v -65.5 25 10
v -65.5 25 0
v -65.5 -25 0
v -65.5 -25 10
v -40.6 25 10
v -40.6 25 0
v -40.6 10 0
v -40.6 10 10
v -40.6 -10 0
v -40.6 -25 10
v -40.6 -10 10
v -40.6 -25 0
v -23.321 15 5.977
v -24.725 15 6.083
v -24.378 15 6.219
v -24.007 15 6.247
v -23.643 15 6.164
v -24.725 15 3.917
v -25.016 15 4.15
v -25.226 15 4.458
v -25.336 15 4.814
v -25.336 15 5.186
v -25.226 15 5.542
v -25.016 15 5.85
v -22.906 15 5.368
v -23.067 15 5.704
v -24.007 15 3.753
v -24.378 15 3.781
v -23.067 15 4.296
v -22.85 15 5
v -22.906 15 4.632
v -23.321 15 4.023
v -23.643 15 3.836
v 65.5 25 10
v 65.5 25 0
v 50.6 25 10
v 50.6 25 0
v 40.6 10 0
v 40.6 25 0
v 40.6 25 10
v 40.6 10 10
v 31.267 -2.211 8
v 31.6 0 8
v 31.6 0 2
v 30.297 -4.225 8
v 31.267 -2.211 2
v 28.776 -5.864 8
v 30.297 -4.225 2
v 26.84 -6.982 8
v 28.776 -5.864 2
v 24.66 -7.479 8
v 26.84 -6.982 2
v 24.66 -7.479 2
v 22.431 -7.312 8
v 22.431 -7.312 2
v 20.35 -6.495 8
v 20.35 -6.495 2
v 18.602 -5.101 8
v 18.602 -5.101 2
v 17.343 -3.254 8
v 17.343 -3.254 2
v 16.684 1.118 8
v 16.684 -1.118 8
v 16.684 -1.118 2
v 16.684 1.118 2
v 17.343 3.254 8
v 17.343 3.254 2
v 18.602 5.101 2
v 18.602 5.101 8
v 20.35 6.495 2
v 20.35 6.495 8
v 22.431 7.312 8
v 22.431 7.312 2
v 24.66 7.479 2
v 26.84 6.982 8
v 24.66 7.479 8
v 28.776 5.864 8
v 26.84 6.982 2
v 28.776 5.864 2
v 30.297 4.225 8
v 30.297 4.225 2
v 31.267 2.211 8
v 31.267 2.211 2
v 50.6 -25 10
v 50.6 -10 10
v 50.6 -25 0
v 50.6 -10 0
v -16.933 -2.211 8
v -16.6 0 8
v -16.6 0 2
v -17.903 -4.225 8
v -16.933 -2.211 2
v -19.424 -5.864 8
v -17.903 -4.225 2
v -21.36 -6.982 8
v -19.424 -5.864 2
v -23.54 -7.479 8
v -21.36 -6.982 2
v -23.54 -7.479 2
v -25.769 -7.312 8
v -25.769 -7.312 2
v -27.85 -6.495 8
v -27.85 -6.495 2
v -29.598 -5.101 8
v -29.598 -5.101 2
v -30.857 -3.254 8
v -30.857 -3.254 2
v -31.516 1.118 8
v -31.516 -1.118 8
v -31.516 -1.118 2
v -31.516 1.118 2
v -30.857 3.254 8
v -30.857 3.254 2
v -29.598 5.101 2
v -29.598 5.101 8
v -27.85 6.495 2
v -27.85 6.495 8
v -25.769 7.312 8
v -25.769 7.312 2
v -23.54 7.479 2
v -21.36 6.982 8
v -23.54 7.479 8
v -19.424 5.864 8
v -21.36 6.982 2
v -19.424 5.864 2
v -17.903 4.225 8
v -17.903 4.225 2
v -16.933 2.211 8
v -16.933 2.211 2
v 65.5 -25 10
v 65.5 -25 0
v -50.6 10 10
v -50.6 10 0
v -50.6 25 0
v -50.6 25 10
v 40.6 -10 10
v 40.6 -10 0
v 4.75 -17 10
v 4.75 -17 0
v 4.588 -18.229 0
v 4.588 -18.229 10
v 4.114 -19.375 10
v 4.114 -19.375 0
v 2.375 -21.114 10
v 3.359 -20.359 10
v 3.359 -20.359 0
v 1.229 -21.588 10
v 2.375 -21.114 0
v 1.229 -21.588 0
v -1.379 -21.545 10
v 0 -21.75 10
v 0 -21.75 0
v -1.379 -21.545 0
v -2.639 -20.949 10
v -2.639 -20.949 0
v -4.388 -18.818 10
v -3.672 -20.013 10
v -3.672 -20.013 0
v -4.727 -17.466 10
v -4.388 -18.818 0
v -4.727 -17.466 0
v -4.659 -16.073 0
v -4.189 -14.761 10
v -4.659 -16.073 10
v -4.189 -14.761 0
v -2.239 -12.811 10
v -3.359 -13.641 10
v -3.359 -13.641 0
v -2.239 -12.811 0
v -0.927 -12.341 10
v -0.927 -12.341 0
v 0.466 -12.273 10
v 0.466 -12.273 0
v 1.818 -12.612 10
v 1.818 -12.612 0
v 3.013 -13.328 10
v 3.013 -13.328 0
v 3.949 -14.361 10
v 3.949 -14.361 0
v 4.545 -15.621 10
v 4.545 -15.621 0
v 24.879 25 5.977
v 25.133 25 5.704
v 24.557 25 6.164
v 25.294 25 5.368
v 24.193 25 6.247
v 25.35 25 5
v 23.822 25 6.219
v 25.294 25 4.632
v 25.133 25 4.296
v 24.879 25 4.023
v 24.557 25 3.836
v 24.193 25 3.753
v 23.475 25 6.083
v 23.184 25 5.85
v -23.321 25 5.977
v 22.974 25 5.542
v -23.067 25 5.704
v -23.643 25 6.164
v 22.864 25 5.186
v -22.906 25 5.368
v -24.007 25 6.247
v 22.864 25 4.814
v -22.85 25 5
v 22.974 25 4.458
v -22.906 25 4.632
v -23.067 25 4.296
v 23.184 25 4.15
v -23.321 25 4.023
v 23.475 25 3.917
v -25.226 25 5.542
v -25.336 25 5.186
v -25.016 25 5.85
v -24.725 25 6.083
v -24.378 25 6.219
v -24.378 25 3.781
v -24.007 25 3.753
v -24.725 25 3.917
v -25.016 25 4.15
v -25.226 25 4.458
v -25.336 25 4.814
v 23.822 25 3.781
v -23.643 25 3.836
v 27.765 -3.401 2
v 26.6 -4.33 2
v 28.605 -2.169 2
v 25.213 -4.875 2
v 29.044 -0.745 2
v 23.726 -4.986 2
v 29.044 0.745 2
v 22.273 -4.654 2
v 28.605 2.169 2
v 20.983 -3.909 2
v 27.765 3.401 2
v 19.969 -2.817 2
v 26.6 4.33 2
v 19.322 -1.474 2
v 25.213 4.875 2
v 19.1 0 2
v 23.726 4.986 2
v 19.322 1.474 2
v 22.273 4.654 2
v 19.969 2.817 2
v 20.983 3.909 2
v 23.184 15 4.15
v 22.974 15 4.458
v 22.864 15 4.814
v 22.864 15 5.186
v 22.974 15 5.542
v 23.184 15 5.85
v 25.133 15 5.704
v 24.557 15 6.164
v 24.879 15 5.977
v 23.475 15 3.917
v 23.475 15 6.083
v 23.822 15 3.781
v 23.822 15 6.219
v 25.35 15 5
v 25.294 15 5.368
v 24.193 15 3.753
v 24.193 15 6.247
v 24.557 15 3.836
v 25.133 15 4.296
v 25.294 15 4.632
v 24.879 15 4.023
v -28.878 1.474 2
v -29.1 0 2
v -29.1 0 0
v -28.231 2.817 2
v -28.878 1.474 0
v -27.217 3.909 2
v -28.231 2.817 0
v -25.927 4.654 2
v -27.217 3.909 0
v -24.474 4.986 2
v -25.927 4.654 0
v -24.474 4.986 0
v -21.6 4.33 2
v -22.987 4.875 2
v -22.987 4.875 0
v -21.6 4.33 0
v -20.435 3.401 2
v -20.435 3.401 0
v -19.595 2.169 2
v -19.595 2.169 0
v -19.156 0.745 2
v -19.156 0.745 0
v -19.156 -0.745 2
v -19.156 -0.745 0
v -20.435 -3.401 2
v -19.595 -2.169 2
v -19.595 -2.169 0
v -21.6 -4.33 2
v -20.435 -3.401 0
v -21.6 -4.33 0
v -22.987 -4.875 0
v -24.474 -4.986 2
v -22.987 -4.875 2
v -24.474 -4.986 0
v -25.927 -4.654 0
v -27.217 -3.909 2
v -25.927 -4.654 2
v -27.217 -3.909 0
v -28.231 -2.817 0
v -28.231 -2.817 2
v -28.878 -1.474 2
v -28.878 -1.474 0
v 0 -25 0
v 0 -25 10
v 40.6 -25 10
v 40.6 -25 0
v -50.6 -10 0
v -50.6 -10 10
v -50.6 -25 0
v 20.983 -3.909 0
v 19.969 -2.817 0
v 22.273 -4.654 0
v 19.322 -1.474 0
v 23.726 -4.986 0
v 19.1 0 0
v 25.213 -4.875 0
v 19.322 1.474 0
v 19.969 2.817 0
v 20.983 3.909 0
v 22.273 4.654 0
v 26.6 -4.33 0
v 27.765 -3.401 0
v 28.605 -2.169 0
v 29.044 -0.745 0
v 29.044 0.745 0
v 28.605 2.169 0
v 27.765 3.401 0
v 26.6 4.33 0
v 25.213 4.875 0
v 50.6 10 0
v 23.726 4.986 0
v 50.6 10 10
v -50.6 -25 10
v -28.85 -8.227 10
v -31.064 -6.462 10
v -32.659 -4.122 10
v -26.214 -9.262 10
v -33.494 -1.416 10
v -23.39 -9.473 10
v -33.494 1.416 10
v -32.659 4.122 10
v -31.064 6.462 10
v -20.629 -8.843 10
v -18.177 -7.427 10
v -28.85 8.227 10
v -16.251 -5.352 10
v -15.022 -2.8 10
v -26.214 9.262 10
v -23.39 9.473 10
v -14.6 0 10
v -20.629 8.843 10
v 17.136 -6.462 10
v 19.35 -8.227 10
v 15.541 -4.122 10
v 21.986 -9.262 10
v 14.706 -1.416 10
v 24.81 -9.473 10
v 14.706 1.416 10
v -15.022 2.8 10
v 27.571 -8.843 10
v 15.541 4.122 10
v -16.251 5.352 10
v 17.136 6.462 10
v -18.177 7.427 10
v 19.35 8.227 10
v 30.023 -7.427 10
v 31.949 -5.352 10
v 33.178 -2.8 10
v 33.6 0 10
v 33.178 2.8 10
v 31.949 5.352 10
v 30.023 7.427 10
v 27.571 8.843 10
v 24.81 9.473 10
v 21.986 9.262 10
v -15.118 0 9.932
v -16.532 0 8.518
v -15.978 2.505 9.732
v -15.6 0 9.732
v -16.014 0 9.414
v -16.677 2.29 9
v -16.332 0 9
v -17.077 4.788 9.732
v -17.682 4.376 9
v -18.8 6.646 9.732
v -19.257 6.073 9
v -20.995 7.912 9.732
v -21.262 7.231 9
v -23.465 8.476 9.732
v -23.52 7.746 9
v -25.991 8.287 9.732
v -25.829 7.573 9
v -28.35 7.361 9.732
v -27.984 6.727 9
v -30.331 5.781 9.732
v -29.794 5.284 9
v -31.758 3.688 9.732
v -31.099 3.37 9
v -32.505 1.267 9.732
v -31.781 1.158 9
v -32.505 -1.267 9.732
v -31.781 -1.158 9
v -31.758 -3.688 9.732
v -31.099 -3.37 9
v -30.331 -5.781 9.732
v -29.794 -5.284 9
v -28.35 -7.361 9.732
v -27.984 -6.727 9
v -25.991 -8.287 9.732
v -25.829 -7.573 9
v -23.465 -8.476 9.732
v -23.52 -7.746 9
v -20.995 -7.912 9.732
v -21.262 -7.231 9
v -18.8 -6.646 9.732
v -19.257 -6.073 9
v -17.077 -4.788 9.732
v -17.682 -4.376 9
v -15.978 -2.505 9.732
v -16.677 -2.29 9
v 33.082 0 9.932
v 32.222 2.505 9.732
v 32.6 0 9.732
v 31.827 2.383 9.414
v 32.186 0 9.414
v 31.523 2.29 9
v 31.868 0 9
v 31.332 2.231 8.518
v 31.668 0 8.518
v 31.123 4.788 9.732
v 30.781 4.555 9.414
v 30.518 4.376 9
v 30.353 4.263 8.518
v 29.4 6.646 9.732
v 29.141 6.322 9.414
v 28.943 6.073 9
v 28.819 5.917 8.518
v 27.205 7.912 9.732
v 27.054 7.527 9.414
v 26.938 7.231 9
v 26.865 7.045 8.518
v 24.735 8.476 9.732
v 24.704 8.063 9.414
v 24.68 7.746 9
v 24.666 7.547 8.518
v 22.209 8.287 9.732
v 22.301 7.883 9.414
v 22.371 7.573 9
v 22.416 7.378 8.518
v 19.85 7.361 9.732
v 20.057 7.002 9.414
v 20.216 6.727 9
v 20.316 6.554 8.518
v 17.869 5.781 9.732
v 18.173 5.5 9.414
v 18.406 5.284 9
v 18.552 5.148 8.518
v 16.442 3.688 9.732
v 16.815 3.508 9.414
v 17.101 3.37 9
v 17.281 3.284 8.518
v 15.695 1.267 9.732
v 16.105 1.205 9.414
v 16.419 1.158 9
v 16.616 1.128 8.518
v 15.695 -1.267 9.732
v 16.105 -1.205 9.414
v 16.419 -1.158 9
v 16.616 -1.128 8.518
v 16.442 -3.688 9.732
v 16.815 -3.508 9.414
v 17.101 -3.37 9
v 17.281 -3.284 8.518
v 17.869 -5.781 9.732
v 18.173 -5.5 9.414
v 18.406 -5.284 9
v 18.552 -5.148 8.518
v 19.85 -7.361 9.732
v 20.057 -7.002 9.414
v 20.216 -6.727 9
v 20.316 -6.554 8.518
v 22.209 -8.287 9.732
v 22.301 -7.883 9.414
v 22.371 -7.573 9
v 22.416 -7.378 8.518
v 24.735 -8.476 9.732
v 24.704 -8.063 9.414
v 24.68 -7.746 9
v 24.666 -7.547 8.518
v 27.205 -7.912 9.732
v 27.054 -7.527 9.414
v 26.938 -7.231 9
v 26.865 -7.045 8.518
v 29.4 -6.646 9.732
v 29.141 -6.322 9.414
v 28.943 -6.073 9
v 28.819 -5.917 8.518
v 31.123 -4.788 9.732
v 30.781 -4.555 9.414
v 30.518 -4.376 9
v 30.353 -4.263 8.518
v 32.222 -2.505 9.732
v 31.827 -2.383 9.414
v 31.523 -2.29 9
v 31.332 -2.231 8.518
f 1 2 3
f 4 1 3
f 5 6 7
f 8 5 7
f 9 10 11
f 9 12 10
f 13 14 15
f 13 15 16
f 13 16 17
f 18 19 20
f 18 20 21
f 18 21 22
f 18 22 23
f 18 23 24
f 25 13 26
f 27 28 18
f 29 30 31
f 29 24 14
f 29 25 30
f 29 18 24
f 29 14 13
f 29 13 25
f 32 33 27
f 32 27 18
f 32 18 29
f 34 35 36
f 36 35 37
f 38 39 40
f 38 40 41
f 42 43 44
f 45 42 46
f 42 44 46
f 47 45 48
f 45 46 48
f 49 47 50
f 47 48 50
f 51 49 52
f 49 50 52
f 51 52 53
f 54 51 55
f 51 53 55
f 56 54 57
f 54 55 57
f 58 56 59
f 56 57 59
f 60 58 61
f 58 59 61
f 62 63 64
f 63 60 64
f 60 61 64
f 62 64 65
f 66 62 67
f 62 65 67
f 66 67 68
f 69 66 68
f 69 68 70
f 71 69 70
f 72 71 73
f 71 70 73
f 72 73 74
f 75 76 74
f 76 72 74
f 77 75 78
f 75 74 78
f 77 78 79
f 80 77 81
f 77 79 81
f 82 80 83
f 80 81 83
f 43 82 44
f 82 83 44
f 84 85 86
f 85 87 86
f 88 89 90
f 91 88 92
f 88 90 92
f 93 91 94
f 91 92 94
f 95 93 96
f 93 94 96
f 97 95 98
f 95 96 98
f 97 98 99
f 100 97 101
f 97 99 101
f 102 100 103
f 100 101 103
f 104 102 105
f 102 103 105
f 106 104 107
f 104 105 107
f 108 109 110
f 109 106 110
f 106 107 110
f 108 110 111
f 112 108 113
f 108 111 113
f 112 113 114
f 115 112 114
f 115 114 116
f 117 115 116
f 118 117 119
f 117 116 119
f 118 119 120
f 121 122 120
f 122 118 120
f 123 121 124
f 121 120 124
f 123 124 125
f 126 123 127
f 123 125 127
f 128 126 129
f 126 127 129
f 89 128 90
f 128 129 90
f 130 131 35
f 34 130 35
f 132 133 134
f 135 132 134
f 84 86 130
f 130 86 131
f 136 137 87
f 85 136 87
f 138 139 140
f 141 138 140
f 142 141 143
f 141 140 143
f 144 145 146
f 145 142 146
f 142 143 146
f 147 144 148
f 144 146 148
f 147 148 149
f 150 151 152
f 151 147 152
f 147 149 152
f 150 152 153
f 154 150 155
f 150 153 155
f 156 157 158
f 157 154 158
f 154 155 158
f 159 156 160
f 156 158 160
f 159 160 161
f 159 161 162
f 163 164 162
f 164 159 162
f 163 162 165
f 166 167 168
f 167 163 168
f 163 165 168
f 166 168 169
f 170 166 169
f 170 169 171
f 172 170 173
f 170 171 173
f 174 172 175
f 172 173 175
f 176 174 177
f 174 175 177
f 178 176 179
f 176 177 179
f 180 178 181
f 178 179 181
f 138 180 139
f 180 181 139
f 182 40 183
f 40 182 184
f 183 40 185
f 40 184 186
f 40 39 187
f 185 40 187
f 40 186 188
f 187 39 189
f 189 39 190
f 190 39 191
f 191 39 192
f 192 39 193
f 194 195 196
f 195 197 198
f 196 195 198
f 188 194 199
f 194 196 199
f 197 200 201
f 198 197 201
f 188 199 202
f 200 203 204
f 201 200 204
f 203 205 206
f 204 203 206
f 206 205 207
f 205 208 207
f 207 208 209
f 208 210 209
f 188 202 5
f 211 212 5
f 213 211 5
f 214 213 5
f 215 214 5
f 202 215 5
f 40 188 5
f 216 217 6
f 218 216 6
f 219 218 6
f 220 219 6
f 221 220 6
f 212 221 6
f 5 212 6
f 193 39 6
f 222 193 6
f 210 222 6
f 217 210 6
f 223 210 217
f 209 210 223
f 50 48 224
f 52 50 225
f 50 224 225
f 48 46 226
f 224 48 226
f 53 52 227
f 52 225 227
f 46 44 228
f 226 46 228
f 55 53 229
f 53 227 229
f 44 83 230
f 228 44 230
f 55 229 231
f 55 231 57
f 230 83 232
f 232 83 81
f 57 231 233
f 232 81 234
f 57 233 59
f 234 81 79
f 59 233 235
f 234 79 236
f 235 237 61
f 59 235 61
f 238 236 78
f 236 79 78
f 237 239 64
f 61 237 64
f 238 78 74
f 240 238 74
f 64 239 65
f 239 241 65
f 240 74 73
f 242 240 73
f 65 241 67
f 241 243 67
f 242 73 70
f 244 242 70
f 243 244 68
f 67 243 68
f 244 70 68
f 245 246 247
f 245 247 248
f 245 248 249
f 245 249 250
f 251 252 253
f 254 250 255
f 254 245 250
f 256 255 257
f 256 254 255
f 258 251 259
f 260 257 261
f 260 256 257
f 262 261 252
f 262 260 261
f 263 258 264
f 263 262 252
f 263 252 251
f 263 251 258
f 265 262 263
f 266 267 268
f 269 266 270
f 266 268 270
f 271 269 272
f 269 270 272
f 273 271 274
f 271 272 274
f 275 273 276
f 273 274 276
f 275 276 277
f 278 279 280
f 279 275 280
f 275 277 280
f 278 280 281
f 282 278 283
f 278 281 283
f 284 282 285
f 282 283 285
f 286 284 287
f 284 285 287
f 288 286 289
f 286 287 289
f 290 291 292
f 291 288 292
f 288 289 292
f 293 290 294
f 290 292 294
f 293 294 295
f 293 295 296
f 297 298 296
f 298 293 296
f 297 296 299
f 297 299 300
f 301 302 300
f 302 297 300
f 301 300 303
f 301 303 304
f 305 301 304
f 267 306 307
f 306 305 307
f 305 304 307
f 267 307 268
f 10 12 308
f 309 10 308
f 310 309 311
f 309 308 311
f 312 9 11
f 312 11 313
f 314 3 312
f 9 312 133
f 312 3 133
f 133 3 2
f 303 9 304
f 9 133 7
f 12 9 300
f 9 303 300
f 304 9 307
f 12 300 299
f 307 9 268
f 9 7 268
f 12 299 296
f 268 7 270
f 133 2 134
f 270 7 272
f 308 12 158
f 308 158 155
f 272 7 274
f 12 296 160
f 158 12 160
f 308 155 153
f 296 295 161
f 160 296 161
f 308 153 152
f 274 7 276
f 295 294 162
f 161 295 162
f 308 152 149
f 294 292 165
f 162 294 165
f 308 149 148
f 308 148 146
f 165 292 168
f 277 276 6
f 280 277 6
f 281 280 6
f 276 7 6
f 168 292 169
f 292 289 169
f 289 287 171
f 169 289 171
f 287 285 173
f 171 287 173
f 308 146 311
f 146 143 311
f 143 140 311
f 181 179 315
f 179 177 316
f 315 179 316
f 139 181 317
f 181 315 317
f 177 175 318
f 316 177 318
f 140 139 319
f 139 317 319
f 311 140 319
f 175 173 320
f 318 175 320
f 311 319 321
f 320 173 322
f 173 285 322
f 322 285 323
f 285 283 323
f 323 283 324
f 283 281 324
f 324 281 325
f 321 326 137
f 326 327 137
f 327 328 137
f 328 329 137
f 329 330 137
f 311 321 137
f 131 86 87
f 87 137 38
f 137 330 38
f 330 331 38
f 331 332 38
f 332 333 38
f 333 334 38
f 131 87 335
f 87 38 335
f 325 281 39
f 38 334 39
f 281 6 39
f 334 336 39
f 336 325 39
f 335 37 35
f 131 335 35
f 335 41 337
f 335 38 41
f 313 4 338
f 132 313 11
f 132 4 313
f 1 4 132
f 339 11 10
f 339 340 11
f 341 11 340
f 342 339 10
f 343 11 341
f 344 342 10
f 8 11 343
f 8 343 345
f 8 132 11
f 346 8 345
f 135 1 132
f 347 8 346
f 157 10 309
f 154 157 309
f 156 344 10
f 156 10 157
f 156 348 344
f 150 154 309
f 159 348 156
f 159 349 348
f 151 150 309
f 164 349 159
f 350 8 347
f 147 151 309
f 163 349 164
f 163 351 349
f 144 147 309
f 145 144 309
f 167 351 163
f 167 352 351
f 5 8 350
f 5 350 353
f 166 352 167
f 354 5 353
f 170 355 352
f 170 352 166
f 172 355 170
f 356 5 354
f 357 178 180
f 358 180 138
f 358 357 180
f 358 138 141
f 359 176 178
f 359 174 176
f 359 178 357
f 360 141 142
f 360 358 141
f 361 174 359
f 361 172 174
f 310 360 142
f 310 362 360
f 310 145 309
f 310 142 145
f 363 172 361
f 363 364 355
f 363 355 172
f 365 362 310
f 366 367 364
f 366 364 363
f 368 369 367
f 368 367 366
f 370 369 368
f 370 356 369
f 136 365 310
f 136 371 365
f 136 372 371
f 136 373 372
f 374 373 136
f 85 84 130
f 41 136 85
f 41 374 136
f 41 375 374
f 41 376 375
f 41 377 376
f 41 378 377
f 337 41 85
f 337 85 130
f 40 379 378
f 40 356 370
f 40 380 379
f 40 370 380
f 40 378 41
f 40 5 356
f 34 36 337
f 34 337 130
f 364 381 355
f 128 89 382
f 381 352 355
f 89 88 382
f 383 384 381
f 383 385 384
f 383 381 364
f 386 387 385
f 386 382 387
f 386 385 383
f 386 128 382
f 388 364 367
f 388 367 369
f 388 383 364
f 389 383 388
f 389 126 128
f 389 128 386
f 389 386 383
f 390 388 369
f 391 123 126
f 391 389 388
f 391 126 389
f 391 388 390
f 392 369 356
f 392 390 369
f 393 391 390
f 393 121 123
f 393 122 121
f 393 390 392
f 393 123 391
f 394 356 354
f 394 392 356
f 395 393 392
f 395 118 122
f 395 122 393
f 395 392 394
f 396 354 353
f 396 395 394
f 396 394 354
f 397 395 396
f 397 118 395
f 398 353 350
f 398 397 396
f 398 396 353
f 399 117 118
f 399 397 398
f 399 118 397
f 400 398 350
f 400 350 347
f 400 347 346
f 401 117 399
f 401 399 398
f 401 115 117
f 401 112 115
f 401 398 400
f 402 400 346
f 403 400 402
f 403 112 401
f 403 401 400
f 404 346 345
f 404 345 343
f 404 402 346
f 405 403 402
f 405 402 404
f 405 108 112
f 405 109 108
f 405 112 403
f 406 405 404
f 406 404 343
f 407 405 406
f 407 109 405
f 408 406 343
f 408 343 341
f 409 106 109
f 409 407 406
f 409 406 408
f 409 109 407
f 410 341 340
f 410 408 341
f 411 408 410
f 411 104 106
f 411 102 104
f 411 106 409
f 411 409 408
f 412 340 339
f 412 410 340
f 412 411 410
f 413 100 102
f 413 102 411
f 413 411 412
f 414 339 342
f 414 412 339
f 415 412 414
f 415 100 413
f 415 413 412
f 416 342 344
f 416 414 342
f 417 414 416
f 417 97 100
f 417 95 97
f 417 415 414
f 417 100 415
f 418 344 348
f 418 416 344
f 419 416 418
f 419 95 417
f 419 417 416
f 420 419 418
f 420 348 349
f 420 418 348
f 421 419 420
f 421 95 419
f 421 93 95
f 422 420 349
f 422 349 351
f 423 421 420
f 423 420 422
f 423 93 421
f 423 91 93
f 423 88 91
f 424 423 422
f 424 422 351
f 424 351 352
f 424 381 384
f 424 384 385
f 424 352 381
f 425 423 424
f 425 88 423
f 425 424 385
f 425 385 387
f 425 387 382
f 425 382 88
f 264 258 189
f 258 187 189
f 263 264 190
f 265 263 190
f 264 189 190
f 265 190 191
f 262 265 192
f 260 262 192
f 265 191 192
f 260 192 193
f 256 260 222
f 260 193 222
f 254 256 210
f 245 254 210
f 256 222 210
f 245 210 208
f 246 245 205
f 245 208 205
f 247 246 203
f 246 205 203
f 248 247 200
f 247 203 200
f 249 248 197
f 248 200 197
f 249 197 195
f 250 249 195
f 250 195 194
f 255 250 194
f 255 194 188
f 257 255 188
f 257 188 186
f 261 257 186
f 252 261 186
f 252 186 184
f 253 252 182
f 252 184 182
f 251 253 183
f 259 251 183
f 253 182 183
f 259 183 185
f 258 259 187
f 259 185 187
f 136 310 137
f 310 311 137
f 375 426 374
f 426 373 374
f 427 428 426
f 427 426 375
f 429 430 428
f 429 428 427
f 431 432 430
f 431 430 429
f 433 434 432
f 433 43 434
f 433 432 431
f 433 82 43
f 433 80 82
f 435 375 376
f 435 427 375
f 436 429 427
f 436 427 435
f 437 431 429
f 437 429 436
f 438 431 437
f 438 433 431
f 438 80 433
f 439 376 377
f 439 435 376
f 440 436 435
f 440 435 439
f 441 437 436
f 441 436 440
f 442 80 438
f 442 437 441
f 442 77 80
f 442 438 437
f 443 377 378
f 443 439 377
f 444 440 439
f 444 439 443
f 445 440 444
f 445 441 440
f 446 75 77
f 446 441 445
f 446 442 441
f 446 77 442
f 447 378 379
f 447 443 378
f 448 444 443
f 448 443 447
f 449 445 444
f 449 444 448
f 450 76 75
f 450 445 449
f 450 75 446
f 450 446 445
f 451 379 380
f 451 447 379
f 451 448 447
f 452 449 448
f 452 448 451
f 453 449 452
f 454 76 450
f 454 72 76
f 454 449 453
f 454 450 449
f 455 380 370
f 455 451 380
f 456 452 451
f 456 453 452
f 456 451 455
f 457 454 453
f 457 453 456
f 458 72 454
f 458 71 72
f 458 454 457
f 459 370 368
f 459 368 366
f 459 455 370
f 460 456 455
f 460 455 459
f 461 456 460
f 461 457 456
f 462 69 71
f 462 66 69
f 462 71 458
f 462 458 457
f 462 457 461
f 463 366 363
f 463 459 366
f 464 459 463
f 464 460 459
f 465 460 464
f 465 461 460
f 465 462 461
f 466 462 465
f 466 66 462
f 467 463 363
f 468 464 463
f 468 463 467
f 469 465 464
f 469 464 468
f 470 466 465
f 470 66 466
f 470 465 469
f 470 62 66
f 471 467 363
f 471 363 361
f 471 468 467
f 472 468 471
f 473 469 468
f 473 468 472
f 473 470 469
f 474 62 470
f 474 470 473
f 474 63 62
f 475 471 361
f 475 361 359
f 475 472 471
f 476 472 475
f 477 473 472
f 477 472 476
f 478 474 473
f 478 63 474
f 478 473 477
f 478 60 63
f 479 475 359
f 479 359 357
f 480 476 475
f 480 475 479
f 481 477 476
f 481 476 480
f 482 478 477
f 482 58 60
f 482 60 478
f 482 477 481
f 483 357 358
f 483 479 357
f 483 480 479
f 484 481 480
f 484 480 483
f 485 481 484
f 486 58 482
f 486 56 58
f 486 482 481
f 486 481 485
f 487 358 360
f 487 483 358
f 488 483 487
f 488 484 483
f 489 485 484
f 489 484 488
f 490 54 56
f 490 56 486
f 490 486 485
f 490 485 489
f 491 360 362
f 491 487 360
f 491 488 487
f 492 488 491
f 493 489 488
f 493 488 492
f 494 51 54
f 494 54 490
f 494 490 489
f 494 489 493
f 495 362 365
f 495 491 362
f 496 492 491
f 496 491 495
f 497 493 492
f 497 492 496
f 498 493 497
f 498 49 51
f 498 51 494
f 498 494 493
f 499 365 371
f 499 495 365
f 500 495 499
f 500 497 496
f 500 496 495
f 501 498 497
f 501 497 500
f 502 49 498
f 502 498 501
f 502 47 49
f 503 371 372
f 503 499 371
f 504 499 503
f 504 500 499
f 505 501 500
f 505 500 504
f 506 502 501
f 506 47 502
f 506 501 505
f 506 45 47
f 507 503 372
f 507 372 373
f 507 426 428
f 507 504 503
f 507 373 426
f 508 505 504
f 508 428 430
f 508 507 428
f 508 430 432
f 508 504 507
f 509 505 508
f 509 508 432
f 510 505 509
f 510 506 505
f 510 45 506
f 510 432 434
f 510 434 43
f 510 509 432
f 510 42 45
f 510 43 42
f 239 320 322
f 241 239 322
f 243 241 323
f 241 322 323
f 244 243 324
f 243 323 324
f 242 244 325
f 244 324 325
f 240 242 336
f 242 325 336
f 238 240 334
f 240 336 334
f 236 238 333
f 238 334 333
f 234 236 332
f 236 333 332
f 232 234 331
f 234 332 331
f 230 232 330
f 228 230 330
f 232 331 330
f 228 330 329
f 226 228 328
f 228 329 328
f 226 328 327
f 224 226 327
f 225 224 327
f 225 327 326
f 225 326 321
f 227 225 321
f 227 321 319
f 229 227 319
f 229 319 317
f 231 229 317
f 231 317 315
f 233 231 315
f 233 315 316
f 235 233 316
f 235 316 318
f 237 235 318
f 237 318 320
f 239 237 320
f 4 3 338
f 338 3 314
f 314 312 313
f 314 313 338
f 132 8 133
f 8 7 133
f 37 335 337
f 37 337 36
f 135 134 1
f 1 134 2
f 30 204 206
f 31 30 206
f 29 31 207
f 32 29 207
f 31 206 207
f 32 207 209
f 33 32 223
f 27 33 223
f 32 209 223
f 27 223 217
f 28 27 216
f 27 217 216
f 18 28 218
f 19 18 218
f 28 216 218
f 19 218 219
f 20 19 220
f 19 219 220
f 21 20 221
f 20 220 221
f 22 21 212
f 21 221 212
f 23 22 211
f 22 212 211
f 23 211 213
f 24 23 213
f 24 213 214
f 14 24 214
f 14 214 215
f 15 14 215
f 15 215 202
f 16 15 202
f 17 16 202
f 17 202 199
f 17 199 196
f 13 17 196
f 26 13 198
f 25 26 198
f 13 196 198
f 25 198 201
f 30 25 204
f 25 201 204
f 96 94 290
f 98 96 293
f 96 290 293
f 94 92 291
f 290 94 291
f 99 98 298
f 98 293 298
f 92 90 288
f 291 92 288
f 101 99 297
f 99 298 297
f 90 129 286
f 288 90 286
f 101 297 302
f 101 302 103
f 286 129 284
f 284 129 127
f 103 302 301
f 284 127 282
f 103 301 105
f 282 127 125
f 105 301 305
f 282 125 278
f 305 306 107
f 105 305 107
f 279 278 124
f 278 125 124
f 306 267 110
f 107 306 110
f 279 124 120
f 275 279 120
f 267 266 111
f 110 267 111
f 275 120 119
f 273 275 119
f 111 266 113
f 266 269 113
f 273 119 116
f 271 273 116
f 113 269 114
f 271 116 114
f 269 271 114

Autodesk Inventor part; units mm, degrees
ref_plane "YZ Plane" through (0, 0, 0) normal (1, 0, 0) x (0, 1, 0)
ref_plane "XZ Plane" through (0, 0, 0) normal (0, 1, 0) x (-1, 0, 0)
ref_plane "XY Plane" through (0, 0, 0) normal (0, 0, 1) x (1, 0, 0)
sketch "Sketch1" plane through (0, 0, 0) normal (0, 0, 1) x (1, 0, 0)
  line L0 (65.5, 25) -> (-65.5, 25)
  line L1 (-65.5, 25) -> (-65.5, -25)
  line L2 (-65.5, -25) -> (65.5, -25)
  line L3 (65.5, -25) -> (65.5, 25)
  line L4 (-40.6, 25) -> (-40.6, 10)
  line L5 (-40.6, 10) -> (-50.6, 10)
  line L6 (-50.6, 10) -> (-50.6, 25)
  line L7 (-40.6, -25) -> (-40.6, -10)
  line L8 (-40.6, -10) -> (-50.6, -10)
  line L9 (-50.6, -10) -> (-50.6, -25)
  line L10 (40.6, 25) -> (40.6, 10)
  line L11 (40.6, 10) -> (50.6, 10)
  line L12 (50.6, 10) -> (50.6, 25)
  line L13 (40.6, -25) -> (40.6, -10)
  line L14 (40.6, -10) -> (50.6, -10)
  line L15 (50.6, -10) -> (50.6, -25)
  circle A0 centre (24.1, 0) radius 7.5
  circle A1 centre (-24.1, 0) radius 7.5
  circle A2 centre (24.1, 0) radius 7.5
  circle A3 centre (-24.1, 0) radius 7.5
  line L16 (0, -25) -> (0, -17)
  circle A4 centre (0, -17) radius 4.75
  dimension "d0" = 15
  dimension "d1" = 15
  dimension "d2" = 15
  dimension "d3" = 15
  dimension "d8" = 15
  dimension "d9" = 15
  dimension "d35" = 8
  dimension "d36" = 9.5
extrude "Extrusion2" add sketch "Sketch1" along normal blind 10 contours A4 | L3 L2 L15 L14 L13 L7 L8 L9 L1 L0 L6 L5 L4 L10 L11 L12
sketch "Sketch2" plane through (-40.6, 25, 0) normal (0, 1, 0) x (1, 0, 0)
  circle A0 centre (64.7, -5) radius 1.25
  circle A1 centre (16.5, -5) radius 1.25
  point P0 (40.6, 0)
  dimension "d15" = 2.5
  dimension "d16" = 2.5
extrude "Extrusion3" cut sketch "Sketch2" against normal blind 10
sketch "Sketch3" plane through (0, 0, 0) normal (0, 0, -1) x (-1, 0, 0)
  circle A0 centre (0, 0) radius 24.1
  circle A1 centre (-24.1, 0) radius 7.5
  circle A2 centre (24.1, 0) radius 7.5
  circle A3 centre (-24.1, 0) radius 5
  circle A4 centre (24.1, 0) radius 5
  dimension "d25" = 48.2
  dimension "d39" = 10
  dimension "d40" = 10
extrude "Extrusion8" cut sketch "Sketch1" along normal blind 10 contours A4
extrude "Extrusion9" add sketch "Sketch3" against normal blind 2 contours A4 A0 A2 | A0 A2 A4 | A1 A0 A3 | A0 A3 A1
fillet "Fillet1" radius 2 2 edges at (-31.6, 0, 10) (16.6, 0, 10)
properties part number "prepazka-sablona"
